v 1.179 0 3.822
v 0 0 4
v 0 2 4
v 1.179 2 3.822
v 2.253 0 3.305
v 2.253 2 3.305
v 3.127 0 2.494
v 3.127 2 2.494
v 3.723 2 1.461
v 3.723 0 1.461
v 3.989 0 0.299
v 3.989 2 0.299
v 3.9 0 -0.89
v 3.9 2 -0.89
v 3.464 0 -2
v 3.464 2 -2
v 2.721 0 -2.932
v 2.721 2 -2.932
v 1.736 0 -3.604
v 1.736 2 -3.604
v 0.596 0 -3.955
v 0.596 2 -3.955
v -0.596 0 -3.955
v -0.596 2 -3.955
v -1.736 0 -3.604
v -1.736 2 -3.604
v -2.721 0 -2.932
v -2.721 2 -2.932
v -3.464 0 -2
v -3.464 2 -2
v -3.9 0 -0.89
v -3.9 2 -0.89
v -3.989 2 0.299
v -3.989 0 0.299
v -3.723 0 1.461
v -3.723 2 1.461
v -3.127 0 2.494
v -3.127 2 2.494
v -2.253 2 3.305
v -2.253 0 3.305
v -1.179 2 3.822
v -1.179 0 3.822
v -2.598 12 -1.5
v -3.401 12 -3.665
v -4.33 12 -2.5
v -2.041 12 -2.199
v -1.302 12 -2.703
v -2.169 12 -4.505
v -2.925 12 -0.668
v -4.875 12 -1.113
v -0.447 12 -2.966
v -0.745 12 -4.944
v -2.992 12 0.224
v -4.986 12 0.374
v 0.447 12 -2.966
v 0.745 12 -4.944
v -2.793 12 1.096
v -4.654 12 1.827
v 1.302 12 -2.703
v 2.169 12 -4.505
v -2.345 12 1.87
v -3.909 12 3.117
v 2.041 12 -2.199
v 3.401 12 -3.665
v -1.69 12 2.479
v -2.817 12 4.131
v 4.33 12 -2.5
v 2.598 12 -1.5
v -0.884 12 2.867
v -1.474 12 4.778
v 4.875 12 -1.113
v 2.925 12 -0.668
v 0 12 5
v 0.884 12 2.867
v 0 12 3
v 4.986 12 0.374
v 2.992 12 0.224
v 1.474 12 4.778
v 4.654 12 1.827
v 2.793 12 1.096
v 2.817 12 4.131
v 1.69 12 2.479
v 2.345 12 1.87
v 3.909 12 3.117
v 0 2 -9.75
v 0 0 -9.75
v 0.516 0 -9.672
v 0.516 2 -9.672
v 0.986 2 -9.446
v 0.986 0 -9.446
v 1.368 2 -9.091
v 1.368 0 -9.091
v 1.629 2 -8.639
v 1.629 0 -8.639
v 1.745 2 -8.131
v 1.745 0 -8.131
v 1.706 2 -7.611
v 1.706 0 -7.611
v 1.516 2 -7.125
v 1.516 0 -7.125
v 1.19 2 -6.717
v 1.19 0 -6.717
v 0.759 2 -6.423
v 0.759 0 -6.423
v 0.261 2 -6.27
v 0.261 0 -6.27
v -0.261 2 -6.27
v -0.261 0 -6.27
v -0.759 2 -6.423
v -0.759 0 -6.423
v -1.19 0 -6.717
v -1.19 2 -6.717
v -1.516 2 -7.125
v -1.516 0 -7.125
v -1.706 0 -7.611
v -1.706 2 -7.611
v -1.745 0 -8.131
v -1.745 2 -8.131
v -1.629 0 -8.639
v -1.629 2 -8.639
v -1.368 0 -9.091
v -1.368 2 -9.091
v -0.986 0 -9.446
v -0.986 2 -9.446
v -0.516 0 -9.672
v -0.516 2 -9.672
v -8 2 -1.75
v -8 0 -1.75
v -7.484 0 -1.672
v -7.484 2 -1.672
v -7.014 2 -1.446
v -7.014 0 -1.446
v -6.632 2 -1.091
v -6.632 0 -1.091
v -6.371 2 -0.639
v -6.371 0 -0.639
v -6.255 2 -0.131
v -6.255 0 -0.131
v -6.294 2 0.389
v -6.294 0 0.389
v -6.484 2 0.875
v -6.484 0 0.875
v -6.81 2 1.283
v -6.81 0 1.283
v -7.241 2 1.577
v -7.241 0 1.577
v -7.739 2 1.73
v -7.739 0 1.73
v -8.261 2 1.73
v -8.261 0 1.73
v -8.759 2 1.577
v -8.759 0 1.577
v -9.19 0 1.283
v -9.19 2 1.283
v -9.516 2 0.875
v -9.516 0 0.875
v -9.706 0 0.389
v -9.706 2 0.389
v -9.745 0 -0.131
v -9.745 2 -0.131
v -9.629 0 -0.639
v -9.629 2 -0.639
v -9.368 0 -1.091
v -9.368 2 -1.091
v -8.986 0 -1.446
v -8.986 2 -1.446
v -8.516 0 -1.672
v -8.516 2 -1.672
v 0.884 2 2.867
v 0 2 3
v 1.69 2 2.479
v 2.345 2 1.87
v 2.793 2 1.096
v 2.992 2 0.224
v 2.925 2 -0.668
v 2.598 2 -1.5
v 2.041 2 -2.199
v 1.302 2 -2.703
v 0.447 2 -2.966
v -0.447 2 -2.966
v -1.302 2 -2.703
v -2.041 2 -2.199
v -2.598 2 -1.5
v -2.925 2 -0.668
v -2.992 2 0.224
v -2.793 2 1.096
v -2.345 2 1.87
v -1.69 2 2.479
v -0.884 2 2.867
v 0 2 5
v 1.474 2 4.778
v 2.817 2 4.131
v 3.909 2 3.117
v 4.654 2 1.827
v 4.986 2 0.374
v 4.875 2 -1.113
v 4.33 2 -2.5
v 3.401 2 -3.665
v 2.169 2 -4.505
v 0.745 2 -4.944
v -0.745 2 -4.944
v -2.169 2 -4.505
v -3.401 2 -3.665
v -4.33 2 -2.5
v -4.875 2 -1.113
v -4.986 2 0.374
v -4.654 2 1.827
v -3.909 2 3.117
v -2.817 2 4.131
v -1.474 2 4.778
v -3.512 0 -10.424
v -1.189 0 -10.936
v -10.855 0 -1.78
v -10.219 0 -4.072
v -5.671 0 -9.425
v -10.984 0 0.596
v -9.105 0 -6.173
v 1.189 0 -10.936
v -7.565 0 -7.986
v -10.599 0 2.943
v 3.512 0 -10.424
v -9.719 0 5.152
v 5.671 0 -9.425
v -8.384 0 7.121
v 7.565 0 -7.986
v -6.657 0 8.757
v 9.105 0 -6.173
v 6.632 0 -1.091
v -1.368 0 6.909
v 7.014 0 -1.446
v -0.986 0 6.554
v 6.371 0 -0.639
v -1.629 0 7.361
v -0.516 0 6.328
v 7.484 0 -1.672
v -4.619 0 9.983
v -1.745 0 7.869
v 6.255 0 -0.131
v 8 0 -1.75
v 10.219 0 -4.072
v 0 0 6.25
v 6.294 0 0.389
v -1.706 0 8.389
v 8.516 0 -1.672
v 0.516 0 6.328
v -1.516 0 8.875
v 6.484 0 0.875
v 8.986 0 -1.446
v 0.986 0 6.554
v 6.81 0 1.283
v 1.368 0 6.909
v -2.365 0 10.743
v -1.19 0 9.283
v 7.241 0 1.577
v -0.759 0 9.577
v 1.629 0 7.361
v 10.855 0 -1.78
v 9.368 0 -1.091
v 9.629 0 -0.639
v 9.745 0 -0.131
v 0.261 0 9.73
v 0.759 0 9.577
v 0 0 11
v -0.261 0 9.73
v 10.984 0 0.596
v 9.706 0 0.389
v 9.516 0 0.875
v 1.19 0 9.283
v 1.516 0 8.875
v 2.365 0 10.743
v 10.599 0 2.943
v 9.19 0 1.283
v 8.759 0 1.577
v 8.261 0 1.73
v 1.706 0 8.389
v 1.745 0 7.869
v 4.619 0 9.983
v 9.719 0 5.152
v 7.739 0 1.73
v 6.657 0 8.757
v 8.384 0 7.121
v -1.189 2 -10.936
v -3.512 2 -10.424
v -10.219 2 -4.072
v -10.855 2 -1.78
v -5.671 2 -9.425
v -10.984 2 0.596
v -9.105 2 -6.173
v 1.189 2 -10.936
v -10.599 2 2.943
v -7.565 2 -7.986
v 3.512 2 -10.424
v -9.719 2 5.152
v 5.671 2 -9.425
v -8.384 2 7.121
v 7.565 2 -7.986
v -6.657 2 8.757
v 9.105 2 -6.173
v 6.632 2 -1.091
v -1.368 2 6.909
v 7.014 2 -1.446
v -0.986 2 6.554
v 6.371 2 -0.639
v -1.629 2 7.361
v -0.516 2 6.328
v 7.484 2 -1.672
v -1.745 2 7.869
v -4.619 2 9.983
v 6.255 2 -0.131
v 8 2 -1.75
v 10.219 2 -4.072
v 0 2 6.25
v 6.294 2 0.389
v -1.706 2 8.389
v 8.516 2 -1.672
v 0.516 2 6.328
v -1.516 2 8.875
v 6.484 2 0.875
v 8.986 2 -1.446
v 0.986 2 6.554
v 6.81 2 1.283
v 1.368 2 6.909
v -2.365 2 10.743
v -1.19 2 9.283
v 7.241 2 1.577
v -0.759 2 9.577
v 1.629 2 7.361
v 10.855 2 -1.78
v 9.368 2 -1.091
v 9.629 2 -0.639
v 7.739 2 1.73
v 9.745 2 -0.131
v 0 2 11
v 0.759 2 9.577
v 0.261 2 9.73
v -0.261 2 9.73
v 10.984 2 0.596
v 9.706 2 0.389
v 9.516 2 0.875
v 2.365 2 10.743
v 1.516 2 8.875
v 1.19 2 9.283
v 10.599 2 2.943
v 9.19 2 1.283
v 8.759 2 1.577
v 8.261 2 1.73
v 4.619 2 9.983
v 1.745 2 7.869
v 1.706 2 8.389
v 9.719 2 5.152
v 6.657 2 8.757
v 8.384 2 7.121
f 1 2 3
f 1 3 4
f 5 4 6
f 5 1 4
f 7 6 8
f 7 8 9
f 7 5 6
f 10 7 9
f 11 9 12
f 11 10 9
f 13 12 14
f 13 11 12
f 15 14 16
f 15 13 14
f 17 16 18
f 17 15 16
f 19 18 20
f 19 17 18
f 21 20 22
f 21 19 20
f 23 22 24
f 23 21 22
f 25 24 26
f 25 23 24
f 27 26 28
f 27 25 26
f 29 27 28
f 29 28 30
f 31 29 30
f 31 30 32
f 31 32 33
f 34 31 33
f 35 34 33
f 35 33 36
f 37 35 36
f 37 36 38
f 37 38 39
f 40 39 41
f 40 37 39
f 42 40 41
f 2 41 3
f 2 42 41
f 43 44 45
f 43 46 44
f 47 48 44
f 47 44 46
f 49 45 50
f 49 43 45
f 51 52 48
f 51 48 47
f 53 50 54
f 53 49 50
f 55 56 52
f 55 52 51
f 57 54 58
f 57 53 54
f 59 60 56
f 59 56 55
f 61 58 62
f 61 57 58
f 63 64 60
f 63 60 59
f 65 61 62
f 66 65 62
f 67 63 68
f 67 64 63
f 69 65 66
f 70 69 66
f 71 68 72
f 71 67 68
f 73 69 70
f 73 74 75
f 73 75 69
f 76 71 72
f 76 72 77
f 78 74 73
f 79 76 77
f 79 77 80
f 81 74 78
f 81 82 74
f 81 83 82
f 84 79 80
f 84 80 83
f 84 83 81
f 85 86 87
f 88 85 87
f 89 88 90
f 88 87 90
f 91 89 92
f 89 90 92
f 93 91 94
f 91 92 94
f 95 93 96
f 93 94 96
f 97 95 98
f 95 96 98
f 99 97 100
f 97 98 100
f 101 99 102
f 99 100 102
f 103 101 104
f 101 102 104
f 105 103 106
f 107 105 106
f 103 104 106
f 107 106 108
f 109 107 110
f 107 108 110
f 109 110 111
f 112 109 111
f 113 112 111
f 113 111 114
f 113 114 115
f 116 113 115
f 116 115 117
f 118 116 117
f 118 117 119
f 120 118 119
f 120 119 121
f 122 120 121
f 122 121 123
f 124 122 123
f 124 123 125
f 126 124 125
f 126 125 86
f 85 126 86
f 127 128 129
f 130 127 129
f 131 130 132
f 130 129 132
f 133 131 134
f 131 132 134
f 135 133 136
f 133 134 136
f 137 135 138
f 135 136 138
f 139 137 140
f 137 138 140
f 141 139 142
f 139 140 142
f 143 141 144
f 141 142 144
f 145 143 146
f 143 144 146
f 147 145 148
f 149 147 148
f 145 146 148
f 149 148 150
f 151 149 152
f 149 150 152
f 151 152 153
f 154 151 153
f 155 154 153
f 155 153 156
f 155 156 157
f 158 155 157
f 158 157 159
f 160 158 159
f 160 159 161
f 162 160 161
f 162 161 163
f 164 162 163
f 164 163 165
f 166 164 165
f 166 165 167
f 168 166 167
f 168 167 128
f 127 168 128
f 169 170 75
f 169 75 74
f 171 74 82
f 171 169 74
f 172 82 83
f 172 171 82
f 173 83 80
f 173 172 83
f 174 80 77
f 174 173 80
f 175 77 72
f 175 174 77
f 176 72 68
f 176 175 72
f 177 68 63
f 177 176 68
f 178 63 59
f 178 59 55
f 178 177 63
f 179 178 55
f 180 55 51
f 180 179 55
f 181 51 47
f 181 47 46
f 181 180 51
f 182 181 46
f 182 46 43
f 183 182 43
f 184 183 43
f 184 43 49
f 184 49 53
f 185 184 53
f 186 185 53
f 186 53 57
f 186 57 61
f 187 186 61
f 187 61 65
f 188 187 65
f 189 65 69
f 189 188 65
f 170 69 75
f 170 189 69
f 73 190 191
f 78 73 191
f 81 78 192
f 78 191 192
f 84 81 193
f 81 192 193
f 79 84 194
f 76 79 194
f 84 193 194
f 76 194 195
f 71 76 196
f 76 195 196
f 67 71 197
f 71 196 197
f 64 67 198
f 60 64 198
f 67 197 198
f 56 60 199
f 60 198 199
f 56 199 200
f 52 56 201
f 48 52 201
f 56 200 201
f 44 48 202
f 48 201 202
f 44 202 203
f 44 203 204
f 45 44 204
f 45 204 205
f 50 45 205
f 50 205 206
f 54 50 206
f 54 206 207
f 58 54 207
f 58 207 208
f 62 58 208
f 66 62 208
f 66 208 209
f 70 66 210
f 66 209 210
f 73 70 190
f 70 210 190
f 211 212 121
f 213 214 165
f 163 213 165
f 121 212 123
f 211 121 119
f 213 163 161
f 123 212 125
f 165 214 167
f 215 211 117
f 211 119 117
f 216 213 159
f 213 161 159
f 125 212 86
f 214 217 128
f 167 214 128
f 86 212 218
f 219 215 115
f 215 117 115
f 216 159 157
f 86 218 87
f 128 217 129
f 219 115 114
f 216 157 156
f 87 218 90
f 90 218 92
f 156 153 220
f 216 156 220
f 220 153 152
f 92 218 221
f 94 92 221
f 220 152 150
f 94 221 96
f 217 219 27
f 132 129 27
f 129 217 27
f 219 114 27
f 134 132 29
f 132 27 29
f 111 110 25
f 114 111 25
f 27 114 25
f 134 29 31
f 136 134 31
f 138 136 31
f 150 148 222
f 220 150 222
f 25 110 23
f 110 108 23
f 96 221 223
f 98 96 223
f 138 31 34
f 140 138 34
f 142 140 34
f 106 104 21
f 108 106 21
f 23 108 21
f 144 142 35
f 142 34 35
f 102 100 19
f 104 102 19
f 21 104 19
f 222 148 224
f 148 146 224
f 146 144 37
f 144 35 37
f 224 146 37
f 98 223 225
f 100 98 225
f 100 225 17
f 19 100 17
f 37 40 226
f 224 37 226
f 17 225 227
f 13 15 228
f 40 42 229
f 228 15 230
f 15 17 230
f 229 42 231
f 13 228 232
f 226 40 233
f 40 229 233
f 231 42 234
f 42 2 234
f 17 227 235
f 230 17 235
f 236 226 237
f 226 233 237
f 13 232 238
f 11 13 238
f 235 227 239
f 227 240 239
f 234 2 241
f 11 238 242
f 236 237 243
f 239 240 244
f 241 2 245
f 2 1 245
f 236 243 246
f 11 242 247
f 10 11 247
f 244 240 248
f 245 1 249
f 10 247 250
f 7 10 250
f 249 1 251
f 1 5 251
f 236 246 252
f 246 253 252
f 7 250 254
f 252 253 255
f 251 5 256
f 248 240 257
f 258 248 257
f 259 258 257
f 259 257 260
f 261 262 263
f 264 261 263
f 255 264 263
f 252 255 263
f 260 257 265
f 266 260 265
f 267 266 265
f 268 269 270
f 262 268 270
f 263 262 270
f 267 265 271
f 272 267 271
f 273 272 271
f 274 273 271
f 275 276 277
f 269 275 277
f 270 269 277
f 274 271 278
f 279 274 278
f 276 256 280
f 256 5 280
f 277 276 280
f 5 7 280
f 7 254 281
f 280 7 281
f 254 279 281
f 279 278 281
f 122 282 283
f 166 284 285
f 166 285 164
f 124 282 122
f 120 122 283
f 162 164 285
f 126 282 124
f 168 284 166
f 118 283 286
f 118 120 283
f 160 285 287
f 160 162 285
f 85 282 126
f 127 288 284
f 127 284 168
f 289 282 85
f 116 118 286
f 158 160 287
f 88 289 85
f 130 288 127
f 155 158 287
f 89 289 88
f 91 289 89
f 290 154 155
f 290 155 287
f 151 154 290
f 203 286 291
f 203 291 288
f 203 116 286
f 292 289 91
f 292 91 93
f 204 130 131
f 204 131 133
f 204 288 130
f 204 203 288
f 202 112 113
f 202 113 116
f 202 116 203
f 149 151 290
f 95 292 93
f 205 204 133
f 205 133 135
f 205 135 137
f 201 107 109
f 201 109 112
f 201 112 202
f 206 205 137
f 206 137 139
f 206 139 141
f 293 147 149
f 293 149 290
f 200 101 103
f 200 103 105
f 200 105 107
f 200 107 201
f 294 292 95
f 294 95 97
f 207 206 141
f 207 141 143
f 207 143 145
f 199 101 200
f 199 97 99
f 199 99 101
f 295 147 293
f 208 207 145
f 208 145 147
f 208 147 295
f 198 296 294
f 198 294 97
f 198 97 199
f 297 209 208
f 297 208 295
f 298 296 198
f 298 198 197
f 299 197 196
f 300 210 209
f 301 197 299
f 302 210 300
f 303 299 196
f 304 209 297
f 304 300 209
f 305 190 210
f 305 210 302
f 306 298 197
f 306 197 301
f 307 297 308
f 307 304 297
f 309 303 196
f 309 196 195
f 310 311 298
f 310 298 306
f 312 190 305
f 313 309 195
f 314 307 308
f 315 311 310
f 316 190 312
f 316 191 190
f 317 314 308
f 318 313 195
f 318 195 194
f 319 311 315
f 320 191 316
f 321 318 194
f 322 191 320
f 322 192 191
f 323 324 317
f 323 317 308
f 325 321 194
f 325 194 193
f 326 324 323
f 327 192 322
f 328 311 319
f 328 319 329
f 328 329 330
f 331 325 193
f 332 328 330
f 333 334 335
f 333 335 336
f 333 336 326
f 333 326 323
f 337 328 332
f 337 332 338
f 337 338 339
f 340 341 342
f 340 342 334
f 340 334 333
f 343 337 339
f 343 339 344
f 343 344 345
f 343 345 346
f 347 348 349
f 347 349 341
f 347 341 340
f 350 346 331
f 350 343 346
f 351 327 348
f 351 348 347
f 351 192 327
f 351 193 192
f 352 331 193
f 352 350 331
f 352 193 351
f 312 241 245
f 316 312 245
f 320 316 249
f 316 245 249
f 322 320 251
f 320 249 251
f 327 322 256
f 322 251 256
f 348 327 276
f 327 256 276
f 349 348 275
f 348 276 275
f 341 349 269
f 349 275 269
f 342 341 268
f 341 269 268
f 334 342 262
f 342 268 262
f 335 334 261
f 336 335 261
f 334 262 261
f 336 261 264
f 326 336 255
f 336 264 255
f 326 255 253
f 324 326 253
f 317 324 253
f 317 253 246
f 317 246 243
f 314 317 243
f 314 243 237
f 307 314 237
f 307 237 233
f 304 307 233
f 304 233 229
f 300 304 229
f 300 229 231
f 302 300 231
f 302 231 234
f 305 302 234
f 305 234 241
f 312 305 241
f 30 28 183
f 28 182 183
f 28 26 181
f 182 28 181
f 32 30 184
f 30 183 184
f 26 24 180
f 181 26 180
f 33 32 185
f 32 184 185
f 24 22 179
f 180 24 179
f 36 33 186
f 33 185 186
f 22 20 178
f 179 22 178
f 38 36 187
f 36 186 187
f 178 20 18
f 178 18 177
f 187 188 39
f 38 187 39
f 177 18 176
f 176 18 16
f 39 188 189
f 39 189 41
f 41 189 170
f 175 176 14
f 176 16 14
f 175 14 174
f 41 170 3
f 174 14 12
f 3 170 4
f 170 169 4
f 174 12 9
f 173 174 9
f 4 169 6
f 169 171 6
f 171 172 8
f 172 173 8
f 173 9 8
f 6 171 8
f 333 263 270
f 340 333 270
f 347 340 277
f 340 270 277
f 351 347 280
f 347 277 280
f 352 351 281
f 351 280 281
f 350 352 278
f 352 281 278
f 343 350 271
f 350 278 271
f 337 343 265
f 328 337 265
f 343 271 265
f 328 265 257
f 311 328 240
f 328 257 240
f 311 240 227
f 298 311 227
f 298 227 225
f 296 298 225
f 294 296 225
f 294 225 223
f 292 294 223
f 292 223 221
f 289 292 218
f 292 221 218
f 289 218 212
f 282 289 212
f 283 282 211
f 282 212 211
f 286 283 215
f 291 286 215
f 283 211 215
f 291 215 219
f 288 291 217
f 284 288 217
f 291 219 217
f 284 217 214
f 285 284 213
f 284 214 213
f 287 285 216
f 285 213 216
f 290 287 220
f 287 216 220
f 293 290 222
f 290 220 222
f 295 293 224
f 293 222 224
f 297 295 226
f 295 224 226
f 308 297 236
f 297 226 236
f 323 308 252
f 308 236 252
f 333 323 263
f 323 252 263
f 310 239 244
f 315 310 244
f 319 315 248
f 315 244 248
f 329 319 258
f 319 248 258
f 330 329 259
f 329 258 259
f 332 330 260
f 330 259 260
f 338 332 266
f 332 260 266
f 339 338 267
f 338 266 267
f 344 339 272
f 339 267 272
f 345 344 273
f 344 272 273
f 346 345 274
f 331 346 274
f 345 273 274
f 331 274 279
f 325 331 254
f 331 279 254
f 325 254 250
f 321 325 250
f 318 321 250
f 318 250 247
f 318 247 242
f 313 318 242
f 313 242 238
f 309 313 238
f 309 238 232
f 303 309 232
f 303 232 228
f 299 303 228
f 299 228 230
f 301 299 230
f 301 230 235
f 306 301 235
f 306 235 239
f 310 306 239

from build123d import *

# Parameters (mm, degrees)
CROQUIS1_R              = 11
CROQUIS1_R_2            = 4
SALIENTE_EXTRUIR1_DEPTH = 2
CROQUIS2_R              = 5
CROQUIS2_R_2            = 3
SALIENTE_EXTRUIR2_DEPTH = 10
CROQUIS3_R              = 1.75
CORTAR_EXTRUIR1_DEPTH   = 10


with BuildPart() as part:
    # Croquis1 → Saliente-Extruir1 (new body)
    with BuildSketch(Plane(origin=(0, 0, 0), x_dir=(1, 0, 0), z_dir=(0, 1, 0))):
        with Locations(Location((0, 0, 0), (0, 0, 270))):
            Circle(CROQUIS1_R)
        with Locations(Location((0, 0, 0), (0, 0, 270))):
            Circle(CROQUIS1_R_2, mode=Mode.SUBTRACT)
    extrude(amount=SALIENTE_EXTRUIR1_DEPTH)

    # Croquis2 → Saliente-Extruir2 (add)
    with BuildSketch(Plane(origin=(0, 2, 0), x_dir=(1, 0, 0), z_dir=(0, 1, 0))):
        with Locations(Location((0, 0, 0), (0, 0, 270))):
            Circle(CROQUIS2_R)
        with Locations(Location((0, 0, 0), (0, 0, 270))):
            Circle(CROQUIS2_R_2, mode=Mode.SUBTRACT)
    extrude(amount=SALIENTE_EXTRUIR2_DEPTH)

    # Croquis3 → Cortar-Extruir1 (cut)
    with BuildSketch(Plane.XZ):
        with Locations(Location((0, 8, 0), (0, 0, 270))):
            Circle(CROQUIS3_R)
        with Locations(Location((8, 0, 0), (0, 0, 270))):
            Circle(CROQUIS3_R)
        with Locations(Location((-8, 0, 0), (0, 0, 270))):
            Circle(CROQUIS3_R)
        with Locations(Location((0, -8, 0), (0, 0, 270))):
            Circle(CROQUIS3_R)
    extrude(amount=-CORTAR_EXTRUIR1_DEPTH, mode=Mode.SUBTRACT)


solid = part.part
